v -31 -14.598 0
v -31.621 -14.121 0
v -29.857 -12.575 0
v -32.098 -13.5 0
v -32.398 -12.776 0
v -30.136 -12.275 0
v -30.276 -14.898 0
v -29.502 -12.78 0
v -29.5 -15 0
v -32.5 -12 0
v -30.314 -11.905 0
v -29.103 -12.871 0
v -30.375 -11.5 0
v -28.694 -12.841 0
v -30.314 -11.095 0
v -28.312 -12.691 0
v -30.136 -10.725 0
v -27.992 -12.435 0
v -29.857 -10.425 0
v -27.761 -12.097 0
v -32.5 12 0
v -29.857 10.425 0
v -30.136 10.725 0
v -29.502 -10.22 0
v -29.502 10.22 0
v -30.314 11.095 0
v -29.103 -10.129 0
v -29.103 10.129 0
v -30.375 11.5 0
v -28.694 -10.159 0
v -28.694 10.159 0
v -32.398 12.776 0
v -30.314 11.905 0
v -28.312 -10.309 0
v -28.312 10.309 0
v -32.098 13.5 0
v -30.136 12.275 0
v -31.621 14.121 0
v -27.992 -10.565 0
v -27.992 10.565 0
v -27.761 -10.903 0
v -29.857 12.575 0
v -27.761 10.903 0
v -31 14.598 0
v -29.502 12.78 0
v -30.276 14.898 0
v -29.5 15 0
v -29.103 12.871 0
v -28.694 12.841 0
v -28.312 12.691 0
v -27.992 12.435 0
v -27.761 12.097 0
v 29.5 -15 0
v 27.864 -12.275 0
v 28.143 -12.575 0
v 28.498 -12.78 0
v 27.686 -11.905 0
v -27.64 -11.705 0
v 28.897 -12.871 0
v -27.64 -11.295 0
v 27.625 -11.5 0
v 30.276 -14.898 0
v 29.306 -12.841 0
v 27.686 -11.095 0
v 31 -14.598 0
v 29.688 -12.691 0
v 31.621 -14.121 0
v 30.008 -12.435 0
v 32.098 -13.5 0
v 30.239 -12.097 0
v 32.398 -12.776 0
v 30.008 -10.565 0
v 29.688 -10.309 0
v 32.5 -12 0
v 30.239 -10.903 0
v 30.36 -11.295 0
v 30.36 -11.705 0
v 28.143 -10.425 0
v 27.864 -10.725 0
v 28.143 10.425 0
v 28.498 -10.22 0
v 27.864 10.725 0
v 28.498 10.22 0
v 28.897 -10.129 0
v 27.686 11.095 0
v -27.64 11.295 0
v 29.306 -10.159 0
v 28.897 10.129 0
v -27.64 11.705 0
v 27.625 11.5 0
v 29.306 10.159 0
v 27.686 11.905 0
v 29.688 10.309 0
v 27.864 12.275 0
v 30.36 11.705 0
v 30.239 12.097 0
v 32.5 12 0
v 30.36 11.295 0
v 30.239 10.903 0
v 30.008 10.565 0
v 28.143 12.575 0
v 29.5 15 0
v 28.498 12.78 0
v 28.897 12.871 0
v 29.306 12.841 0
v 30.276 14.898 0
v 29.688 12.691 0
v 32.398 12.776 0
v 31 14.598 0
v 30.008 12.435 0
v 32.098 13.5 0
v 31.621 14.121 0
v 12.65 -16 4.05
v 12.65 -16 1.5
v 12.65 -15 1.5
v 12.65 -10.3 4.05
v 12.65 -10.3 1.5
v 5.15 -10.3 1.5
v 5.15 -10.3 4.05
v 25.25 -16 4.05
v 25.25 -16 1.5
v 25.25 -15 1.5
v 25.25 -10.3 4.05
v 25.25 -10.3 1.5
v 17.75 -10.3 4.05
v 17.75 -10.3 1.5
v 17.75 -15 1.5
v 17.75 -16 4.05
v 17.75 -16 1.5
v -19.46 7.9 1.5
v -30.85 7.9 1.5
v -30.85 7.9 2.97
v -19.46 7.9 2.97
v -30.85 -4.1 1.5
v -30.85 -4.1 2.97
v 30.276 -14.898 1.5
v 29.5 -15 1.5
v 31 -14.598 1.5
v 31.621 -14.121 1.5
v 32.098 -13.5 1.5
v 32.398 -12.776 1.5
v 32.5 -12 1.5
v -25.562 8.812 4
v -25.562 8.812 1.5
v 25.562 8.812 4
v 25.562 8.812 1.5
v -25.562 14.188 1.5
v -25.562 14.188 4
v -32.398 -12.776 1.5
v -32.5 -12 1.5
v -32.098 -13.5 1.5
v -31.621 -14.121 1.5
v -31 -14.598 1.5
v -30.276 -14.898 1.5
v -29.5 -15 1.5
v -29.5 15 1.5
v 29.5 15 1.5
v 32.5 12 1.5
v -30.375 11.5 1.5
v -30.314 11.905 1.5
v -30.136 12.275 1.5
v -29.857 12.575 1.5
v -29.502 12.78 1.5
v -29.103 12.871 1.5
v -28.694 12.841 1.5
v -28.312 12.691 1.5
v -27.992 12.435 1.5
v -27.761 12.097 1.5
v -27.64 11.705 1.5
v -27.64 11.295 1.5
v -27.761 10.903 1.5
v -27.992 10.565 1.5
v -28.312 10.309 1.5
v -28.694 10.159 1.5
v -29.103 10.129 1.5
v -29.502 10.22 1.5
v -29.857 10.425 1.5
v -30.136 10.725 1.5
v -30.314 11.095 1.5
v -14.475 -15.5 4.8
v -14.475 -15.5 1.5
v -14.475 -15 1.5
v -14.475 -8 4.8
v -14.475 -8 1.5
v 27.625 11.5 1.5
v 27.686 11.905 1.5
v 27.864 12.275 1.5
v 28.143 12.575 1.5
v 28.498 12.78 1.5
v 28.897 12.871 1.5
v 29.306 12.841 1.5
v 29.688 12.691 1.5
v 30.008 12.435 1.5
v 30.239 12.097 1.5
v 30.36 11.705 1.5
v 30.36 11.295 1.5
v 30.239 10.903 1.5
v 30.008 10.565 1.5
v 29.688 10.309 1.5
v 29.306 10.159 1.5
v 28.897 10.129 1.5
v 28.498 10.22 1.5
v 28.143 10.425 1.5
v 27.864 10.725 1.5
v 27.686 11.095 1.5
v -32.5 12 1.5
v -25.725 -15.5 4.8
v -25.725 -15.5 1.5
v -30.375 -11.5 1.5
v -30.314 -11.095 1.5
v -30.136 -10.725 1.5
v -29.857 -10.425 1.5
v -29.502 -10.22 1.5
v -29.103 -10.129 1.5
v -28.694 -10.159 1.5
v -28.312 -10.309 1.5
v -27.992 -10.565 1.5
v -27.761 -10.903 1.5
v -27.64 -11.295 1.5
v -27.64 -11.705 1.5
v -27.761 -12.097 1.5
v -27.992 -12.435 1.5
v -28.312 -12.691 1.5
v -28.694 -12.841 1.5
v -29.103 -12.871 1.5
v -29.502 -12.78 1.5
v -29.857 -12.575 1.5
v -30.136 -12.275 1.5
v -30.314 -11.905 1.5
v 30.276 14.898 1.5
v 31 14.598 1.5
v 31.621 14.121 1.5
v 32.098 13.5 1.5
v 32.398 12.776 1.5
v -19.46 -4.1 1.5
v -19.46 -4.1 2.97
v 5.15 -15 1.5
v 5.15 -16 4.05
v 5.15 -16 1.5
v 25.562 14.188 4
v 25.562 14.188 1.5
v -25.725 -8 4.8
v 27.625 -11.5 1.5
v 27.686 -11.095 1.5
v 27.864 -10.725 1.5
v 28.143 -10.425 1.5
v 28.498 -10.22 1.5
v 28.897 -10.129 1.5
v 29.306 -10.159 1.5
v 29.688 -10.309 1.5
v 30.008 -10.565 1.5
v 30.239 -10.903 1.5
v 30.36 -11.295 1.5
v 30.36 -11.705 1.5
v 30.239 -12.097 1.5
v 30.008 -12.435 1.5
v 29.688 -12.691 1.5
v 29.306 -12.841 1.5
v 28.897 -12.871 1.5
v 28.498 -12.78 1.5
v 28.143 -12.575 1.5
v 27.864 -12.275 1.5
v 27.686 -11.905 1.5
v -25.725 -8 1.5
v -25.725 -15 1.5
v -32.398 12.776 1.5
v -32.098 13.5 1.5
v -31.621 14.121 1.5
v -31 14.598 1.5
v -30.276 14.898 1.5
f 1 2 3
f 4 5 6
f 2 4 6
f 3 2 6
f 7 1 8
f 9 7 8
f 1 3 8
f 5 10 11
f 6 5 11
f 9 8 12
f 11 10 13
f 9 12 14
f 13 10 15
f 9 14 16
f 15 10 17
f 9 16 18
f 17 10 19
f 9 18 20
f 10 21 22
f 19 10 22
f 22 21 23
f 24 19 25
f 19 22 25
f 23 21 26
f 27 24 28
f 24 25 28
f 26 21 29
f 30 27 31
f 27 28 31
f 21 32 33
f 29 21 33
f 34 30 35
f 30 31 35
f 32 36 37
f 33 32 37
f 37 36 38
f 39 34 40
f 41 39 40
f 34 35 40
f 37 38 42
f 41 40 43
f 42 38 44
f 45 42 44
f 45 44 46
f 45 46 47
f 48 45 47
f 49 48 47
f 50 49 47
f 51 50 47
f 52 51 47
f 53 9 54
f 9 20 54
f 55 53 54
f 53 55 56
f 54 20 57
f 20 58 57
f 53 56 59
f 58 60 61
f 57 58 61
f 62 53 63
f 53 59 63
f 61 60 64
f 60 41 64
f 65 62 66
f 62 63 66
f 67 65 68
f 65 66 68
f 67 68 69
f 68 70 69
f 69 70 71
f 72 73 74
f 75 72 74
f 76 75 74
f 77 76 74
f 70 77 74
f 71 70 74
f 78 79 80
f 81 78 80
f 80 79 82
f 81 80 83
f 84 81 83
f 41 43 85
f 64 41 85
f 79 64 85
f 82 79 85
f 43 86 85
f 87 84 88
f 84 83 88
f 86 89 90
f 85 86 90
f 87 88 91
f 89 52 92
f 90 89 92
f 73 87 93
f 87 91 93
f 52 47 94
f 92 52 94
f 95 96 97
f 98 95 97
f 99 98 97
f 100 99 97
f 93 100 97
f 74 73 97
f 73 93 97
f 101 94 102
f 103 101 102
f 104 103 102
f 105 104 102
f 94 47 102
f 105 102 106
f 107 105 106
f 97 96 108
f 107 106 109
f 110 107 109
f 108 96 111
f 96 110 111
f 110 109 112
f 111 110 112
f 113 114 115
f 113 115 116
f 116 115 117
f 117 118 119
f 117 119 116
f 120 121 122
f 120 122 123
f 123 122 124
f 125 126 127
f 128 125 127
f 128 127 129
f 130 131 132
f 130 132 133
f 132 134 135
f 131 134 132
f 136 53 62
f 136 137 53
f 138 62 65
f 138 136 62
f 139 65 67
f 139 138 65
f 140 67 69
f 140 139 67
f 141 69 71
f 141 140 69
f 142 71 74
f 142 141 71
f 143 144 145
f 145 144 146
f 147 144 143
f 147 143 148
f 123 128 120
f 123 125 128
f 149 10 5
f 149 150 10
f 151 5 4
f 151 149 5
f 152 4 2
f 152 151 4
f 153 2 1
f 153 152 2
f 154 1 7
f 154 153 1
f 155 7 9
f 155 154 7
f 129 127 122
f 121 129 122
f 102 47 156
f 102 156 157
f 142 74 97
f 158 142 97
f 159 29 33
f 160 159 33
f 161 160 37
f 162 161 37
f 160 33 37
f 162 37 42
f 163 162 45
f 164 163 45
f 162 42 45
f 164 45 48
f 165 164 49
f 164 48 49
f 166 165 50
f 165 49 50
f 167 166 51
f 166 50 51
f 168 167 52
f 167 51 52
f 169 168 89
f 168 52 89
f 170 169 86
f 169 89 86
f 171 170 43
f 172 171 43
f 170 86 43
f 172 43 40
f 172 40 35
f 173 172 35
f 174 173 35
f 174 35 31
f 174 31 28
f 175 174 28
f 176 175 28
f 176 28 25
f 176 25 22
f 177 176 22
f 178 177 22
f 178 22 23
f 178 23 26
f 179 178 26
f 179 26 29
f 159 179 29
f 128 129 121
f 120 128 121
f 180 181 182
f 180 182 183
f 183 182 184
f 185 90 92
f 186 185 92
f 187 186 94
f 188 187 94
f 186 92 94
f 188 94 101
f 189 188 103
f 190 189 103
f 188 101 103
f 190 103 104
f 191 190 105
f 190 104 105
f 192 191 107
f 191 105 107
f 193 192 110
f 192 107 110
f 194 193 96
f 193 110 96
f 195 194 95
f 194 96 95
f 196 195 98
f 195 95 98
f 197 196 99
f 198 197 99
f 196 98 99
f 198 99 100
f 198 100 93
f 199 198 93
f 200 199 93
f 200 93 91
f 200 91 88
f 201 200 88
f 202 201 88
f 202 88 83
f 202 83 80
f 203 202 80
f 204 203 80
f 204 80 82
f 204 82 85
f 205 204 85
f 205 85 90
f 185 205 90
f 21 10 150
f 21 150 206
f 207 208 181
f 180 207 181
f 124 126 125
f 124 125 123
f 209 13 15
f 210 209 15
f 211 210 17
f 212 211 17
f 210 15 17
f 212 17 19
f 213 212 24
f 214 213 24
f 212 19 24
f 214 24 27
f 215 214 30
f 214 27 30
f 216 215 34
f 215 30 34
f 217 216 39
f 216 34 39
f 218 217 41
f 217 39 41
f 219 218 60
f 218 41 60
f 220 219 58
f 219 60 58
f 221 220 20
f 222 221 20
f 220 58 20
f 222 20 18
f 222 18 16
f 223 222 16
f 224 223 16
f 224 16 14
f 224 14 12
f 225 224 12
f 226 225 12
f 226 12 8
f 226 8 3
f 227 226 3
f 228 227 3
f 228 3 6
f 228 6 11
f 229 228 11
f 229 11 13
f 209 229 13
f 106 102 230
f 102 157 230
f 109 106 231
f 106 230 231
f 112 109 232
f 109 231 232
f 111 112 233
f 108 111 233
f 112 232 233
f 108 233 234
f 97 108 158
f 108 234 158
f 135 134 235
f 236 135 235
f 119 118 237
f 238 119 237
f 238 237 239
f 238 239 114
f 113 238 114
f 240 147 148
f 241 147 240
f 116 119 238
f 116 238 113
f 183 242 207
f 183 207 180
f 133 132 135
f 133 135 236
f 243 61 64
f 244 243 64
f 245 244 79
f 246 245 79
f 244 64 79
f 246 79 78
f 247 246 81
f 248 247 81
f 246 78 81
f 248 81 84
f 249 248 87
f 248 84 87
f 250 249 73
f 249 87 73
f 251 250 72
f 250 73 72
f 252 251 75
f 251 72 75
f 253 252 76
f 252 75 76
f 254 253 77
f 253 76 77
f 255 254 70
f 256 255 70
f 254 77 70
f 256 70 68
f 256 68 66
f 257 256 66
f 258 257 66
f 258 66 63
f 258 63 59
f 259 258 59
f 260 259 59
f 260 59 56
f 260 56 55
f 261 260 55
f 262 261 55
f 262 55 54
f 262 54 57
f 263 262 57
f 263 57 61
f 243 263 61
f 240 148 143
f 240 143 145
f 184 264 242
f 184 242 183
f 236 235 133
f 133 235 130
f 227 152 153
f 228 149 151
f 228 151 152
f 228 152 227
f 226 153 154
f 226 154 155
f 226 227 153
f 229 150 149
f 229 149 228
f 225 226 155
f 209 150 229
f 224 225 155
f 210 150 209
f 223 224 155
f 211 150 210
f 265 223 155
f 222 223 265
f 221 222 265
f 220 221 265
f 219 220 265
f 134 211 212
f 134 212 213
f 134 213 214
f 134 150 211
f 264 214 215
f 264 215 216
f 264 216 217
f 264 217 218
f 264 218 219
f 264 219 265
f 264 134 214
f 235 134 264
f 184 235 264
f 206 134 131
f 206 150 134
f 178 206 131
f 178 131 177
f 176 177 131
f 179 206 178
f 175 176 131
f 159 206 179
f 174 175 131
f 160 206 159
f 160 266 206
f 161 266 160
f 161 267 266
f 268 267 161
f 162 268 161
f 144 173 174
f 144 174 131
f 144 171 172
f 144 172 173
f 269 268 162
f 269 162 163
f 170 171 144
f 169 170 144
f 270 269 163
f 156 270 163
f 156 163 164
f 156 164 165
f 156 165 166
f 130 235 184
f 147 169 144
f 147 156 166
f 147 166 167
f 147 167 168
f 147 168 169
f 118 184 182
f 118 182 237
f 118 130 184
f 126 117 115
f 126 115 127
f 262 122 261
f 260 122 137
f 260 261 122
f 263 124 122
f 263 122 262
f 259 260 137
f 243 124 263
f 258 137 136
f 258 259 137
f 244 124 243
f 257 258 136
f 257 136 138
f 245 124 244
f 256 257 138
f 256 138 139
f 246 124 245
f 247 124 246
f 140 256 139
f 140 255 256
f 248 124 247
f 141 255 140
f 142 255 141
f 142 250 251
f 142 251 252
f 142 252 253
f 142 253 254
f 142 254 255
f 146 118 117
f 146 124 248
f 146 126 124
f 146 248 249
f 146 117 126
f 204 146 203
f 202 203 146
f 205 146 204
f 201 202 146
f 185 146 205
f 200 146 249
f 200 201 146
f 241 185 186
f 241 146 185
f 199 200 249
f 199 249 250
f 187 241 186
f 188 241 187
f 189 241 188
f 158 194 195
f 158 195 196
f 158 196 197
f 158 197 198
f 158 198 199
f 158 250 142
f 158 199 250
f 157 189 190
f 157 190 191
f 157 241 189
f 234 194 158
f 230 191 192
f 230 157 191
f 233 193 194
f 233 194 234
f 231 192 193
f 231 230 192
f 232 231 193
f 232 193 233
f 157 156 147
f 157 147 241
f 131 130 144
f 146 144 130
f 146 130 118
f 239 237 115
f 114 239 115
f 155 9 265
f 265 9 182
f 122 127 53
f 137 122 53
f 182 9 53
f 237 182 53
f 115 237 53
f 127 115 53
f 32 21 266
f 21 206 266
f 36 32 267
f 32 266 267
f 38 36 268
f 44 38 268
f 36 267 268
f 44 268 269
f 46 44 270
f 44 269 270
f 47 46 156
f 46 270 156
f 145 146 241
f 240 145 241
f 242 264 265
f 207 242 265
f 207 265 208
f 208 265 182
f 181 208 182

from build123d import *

# Parameters (mm, degrees)
F0_W     = 65
F0_H     = 30
F1_DEPTH = 1.5
F3_D     = 2.75
F4_R     = 3
F5_W     = 7.5
F5_H     = 4.7
F5_H_2   = 1
F6_DEPTH = 2.55
F5_W_2   = 11.25
F5_H_3   = 7
F5_H_4   = 0.5
F7_DEPTH = 3.3
F5_W_3   = 11.39
F5_H_5   = 12
F8_DEPTH = 1.47
F5_W_4   = 51.125
F5_H_6   = 5.375
F9_DEPTH = 2.5


with BuildPart() as f1:
    # F0 (on Top) → F1 (new body)
    with BuildSketch(Plane.XY):
        Rectangle(F0_W, F0_H)
    extrude(amount=F1_DEPTH)

    # F3 (through all)
    with Locations(Plane.XY.offset(1.5)):
        with Locations((-29, 11.5), (-29, -11.5), (29, -11.5), (29, 11.5)):
            Hole(F3_D / 2)

    # F4
    f4_edges = [f1.edges().sort_by_distance(p)[0] for p in [
        (-32.5, -15, 0.75),
        (-32.5, 15, 0.75),
        (32.5, -15, 0.75),
        (32.5, 15, 0.75),
    ]]
    fillet(f4_edges, radius=F4_R)

    # F5 (on face) → F6 (join)
    with BuildSketch(Plane.XY.offset(1.5)):
        with Locations((8.9, -12.65)):
            Rectangle(F5_W, F5_H)
        with Locations((8.9, -15.5)):
            Rectangle(F5_W, F5_H_2)
        with Locations((21.5, -15.5)):
            Rectangle(F5_W, F5_H_2)
        with Locations((21.5, -12.65)):
            Rectangle(F5_W, F5_H)
    extrude(amount=F6_DEPTH)

    # F5 (on face) → F7 (join)
    with BuildSketch(Plane.XY.offset(1.5)):
        with Locations((-20.1, -11.5)):
            Rectangle(F5_W_2, F5_H_3)
        with Locations((-20.1, -15.25)):
            Rectangle(F5_W_2, F5_H_4)
    extrude(amount=F7_DEPTH)

    # F5 (on face) → F8 (join)
    with BuildSketch(Plane.XY.offset(1.5)):
        with Locations((-25.155, 1.9)):
            Rectangle(F5_W_3, F5_H_5)
    extrude(amount=F8_DEPTH)

    # F5 (on face) → F9 (join)
    with BuildSketch(Plane.XY.offset(1.5)):
        with Locations((0, 11.5)):
            Rectangle(F5_W_4, F5_H_6)
    extrude(amount=F9_DEPTH)


solid = f1.part
